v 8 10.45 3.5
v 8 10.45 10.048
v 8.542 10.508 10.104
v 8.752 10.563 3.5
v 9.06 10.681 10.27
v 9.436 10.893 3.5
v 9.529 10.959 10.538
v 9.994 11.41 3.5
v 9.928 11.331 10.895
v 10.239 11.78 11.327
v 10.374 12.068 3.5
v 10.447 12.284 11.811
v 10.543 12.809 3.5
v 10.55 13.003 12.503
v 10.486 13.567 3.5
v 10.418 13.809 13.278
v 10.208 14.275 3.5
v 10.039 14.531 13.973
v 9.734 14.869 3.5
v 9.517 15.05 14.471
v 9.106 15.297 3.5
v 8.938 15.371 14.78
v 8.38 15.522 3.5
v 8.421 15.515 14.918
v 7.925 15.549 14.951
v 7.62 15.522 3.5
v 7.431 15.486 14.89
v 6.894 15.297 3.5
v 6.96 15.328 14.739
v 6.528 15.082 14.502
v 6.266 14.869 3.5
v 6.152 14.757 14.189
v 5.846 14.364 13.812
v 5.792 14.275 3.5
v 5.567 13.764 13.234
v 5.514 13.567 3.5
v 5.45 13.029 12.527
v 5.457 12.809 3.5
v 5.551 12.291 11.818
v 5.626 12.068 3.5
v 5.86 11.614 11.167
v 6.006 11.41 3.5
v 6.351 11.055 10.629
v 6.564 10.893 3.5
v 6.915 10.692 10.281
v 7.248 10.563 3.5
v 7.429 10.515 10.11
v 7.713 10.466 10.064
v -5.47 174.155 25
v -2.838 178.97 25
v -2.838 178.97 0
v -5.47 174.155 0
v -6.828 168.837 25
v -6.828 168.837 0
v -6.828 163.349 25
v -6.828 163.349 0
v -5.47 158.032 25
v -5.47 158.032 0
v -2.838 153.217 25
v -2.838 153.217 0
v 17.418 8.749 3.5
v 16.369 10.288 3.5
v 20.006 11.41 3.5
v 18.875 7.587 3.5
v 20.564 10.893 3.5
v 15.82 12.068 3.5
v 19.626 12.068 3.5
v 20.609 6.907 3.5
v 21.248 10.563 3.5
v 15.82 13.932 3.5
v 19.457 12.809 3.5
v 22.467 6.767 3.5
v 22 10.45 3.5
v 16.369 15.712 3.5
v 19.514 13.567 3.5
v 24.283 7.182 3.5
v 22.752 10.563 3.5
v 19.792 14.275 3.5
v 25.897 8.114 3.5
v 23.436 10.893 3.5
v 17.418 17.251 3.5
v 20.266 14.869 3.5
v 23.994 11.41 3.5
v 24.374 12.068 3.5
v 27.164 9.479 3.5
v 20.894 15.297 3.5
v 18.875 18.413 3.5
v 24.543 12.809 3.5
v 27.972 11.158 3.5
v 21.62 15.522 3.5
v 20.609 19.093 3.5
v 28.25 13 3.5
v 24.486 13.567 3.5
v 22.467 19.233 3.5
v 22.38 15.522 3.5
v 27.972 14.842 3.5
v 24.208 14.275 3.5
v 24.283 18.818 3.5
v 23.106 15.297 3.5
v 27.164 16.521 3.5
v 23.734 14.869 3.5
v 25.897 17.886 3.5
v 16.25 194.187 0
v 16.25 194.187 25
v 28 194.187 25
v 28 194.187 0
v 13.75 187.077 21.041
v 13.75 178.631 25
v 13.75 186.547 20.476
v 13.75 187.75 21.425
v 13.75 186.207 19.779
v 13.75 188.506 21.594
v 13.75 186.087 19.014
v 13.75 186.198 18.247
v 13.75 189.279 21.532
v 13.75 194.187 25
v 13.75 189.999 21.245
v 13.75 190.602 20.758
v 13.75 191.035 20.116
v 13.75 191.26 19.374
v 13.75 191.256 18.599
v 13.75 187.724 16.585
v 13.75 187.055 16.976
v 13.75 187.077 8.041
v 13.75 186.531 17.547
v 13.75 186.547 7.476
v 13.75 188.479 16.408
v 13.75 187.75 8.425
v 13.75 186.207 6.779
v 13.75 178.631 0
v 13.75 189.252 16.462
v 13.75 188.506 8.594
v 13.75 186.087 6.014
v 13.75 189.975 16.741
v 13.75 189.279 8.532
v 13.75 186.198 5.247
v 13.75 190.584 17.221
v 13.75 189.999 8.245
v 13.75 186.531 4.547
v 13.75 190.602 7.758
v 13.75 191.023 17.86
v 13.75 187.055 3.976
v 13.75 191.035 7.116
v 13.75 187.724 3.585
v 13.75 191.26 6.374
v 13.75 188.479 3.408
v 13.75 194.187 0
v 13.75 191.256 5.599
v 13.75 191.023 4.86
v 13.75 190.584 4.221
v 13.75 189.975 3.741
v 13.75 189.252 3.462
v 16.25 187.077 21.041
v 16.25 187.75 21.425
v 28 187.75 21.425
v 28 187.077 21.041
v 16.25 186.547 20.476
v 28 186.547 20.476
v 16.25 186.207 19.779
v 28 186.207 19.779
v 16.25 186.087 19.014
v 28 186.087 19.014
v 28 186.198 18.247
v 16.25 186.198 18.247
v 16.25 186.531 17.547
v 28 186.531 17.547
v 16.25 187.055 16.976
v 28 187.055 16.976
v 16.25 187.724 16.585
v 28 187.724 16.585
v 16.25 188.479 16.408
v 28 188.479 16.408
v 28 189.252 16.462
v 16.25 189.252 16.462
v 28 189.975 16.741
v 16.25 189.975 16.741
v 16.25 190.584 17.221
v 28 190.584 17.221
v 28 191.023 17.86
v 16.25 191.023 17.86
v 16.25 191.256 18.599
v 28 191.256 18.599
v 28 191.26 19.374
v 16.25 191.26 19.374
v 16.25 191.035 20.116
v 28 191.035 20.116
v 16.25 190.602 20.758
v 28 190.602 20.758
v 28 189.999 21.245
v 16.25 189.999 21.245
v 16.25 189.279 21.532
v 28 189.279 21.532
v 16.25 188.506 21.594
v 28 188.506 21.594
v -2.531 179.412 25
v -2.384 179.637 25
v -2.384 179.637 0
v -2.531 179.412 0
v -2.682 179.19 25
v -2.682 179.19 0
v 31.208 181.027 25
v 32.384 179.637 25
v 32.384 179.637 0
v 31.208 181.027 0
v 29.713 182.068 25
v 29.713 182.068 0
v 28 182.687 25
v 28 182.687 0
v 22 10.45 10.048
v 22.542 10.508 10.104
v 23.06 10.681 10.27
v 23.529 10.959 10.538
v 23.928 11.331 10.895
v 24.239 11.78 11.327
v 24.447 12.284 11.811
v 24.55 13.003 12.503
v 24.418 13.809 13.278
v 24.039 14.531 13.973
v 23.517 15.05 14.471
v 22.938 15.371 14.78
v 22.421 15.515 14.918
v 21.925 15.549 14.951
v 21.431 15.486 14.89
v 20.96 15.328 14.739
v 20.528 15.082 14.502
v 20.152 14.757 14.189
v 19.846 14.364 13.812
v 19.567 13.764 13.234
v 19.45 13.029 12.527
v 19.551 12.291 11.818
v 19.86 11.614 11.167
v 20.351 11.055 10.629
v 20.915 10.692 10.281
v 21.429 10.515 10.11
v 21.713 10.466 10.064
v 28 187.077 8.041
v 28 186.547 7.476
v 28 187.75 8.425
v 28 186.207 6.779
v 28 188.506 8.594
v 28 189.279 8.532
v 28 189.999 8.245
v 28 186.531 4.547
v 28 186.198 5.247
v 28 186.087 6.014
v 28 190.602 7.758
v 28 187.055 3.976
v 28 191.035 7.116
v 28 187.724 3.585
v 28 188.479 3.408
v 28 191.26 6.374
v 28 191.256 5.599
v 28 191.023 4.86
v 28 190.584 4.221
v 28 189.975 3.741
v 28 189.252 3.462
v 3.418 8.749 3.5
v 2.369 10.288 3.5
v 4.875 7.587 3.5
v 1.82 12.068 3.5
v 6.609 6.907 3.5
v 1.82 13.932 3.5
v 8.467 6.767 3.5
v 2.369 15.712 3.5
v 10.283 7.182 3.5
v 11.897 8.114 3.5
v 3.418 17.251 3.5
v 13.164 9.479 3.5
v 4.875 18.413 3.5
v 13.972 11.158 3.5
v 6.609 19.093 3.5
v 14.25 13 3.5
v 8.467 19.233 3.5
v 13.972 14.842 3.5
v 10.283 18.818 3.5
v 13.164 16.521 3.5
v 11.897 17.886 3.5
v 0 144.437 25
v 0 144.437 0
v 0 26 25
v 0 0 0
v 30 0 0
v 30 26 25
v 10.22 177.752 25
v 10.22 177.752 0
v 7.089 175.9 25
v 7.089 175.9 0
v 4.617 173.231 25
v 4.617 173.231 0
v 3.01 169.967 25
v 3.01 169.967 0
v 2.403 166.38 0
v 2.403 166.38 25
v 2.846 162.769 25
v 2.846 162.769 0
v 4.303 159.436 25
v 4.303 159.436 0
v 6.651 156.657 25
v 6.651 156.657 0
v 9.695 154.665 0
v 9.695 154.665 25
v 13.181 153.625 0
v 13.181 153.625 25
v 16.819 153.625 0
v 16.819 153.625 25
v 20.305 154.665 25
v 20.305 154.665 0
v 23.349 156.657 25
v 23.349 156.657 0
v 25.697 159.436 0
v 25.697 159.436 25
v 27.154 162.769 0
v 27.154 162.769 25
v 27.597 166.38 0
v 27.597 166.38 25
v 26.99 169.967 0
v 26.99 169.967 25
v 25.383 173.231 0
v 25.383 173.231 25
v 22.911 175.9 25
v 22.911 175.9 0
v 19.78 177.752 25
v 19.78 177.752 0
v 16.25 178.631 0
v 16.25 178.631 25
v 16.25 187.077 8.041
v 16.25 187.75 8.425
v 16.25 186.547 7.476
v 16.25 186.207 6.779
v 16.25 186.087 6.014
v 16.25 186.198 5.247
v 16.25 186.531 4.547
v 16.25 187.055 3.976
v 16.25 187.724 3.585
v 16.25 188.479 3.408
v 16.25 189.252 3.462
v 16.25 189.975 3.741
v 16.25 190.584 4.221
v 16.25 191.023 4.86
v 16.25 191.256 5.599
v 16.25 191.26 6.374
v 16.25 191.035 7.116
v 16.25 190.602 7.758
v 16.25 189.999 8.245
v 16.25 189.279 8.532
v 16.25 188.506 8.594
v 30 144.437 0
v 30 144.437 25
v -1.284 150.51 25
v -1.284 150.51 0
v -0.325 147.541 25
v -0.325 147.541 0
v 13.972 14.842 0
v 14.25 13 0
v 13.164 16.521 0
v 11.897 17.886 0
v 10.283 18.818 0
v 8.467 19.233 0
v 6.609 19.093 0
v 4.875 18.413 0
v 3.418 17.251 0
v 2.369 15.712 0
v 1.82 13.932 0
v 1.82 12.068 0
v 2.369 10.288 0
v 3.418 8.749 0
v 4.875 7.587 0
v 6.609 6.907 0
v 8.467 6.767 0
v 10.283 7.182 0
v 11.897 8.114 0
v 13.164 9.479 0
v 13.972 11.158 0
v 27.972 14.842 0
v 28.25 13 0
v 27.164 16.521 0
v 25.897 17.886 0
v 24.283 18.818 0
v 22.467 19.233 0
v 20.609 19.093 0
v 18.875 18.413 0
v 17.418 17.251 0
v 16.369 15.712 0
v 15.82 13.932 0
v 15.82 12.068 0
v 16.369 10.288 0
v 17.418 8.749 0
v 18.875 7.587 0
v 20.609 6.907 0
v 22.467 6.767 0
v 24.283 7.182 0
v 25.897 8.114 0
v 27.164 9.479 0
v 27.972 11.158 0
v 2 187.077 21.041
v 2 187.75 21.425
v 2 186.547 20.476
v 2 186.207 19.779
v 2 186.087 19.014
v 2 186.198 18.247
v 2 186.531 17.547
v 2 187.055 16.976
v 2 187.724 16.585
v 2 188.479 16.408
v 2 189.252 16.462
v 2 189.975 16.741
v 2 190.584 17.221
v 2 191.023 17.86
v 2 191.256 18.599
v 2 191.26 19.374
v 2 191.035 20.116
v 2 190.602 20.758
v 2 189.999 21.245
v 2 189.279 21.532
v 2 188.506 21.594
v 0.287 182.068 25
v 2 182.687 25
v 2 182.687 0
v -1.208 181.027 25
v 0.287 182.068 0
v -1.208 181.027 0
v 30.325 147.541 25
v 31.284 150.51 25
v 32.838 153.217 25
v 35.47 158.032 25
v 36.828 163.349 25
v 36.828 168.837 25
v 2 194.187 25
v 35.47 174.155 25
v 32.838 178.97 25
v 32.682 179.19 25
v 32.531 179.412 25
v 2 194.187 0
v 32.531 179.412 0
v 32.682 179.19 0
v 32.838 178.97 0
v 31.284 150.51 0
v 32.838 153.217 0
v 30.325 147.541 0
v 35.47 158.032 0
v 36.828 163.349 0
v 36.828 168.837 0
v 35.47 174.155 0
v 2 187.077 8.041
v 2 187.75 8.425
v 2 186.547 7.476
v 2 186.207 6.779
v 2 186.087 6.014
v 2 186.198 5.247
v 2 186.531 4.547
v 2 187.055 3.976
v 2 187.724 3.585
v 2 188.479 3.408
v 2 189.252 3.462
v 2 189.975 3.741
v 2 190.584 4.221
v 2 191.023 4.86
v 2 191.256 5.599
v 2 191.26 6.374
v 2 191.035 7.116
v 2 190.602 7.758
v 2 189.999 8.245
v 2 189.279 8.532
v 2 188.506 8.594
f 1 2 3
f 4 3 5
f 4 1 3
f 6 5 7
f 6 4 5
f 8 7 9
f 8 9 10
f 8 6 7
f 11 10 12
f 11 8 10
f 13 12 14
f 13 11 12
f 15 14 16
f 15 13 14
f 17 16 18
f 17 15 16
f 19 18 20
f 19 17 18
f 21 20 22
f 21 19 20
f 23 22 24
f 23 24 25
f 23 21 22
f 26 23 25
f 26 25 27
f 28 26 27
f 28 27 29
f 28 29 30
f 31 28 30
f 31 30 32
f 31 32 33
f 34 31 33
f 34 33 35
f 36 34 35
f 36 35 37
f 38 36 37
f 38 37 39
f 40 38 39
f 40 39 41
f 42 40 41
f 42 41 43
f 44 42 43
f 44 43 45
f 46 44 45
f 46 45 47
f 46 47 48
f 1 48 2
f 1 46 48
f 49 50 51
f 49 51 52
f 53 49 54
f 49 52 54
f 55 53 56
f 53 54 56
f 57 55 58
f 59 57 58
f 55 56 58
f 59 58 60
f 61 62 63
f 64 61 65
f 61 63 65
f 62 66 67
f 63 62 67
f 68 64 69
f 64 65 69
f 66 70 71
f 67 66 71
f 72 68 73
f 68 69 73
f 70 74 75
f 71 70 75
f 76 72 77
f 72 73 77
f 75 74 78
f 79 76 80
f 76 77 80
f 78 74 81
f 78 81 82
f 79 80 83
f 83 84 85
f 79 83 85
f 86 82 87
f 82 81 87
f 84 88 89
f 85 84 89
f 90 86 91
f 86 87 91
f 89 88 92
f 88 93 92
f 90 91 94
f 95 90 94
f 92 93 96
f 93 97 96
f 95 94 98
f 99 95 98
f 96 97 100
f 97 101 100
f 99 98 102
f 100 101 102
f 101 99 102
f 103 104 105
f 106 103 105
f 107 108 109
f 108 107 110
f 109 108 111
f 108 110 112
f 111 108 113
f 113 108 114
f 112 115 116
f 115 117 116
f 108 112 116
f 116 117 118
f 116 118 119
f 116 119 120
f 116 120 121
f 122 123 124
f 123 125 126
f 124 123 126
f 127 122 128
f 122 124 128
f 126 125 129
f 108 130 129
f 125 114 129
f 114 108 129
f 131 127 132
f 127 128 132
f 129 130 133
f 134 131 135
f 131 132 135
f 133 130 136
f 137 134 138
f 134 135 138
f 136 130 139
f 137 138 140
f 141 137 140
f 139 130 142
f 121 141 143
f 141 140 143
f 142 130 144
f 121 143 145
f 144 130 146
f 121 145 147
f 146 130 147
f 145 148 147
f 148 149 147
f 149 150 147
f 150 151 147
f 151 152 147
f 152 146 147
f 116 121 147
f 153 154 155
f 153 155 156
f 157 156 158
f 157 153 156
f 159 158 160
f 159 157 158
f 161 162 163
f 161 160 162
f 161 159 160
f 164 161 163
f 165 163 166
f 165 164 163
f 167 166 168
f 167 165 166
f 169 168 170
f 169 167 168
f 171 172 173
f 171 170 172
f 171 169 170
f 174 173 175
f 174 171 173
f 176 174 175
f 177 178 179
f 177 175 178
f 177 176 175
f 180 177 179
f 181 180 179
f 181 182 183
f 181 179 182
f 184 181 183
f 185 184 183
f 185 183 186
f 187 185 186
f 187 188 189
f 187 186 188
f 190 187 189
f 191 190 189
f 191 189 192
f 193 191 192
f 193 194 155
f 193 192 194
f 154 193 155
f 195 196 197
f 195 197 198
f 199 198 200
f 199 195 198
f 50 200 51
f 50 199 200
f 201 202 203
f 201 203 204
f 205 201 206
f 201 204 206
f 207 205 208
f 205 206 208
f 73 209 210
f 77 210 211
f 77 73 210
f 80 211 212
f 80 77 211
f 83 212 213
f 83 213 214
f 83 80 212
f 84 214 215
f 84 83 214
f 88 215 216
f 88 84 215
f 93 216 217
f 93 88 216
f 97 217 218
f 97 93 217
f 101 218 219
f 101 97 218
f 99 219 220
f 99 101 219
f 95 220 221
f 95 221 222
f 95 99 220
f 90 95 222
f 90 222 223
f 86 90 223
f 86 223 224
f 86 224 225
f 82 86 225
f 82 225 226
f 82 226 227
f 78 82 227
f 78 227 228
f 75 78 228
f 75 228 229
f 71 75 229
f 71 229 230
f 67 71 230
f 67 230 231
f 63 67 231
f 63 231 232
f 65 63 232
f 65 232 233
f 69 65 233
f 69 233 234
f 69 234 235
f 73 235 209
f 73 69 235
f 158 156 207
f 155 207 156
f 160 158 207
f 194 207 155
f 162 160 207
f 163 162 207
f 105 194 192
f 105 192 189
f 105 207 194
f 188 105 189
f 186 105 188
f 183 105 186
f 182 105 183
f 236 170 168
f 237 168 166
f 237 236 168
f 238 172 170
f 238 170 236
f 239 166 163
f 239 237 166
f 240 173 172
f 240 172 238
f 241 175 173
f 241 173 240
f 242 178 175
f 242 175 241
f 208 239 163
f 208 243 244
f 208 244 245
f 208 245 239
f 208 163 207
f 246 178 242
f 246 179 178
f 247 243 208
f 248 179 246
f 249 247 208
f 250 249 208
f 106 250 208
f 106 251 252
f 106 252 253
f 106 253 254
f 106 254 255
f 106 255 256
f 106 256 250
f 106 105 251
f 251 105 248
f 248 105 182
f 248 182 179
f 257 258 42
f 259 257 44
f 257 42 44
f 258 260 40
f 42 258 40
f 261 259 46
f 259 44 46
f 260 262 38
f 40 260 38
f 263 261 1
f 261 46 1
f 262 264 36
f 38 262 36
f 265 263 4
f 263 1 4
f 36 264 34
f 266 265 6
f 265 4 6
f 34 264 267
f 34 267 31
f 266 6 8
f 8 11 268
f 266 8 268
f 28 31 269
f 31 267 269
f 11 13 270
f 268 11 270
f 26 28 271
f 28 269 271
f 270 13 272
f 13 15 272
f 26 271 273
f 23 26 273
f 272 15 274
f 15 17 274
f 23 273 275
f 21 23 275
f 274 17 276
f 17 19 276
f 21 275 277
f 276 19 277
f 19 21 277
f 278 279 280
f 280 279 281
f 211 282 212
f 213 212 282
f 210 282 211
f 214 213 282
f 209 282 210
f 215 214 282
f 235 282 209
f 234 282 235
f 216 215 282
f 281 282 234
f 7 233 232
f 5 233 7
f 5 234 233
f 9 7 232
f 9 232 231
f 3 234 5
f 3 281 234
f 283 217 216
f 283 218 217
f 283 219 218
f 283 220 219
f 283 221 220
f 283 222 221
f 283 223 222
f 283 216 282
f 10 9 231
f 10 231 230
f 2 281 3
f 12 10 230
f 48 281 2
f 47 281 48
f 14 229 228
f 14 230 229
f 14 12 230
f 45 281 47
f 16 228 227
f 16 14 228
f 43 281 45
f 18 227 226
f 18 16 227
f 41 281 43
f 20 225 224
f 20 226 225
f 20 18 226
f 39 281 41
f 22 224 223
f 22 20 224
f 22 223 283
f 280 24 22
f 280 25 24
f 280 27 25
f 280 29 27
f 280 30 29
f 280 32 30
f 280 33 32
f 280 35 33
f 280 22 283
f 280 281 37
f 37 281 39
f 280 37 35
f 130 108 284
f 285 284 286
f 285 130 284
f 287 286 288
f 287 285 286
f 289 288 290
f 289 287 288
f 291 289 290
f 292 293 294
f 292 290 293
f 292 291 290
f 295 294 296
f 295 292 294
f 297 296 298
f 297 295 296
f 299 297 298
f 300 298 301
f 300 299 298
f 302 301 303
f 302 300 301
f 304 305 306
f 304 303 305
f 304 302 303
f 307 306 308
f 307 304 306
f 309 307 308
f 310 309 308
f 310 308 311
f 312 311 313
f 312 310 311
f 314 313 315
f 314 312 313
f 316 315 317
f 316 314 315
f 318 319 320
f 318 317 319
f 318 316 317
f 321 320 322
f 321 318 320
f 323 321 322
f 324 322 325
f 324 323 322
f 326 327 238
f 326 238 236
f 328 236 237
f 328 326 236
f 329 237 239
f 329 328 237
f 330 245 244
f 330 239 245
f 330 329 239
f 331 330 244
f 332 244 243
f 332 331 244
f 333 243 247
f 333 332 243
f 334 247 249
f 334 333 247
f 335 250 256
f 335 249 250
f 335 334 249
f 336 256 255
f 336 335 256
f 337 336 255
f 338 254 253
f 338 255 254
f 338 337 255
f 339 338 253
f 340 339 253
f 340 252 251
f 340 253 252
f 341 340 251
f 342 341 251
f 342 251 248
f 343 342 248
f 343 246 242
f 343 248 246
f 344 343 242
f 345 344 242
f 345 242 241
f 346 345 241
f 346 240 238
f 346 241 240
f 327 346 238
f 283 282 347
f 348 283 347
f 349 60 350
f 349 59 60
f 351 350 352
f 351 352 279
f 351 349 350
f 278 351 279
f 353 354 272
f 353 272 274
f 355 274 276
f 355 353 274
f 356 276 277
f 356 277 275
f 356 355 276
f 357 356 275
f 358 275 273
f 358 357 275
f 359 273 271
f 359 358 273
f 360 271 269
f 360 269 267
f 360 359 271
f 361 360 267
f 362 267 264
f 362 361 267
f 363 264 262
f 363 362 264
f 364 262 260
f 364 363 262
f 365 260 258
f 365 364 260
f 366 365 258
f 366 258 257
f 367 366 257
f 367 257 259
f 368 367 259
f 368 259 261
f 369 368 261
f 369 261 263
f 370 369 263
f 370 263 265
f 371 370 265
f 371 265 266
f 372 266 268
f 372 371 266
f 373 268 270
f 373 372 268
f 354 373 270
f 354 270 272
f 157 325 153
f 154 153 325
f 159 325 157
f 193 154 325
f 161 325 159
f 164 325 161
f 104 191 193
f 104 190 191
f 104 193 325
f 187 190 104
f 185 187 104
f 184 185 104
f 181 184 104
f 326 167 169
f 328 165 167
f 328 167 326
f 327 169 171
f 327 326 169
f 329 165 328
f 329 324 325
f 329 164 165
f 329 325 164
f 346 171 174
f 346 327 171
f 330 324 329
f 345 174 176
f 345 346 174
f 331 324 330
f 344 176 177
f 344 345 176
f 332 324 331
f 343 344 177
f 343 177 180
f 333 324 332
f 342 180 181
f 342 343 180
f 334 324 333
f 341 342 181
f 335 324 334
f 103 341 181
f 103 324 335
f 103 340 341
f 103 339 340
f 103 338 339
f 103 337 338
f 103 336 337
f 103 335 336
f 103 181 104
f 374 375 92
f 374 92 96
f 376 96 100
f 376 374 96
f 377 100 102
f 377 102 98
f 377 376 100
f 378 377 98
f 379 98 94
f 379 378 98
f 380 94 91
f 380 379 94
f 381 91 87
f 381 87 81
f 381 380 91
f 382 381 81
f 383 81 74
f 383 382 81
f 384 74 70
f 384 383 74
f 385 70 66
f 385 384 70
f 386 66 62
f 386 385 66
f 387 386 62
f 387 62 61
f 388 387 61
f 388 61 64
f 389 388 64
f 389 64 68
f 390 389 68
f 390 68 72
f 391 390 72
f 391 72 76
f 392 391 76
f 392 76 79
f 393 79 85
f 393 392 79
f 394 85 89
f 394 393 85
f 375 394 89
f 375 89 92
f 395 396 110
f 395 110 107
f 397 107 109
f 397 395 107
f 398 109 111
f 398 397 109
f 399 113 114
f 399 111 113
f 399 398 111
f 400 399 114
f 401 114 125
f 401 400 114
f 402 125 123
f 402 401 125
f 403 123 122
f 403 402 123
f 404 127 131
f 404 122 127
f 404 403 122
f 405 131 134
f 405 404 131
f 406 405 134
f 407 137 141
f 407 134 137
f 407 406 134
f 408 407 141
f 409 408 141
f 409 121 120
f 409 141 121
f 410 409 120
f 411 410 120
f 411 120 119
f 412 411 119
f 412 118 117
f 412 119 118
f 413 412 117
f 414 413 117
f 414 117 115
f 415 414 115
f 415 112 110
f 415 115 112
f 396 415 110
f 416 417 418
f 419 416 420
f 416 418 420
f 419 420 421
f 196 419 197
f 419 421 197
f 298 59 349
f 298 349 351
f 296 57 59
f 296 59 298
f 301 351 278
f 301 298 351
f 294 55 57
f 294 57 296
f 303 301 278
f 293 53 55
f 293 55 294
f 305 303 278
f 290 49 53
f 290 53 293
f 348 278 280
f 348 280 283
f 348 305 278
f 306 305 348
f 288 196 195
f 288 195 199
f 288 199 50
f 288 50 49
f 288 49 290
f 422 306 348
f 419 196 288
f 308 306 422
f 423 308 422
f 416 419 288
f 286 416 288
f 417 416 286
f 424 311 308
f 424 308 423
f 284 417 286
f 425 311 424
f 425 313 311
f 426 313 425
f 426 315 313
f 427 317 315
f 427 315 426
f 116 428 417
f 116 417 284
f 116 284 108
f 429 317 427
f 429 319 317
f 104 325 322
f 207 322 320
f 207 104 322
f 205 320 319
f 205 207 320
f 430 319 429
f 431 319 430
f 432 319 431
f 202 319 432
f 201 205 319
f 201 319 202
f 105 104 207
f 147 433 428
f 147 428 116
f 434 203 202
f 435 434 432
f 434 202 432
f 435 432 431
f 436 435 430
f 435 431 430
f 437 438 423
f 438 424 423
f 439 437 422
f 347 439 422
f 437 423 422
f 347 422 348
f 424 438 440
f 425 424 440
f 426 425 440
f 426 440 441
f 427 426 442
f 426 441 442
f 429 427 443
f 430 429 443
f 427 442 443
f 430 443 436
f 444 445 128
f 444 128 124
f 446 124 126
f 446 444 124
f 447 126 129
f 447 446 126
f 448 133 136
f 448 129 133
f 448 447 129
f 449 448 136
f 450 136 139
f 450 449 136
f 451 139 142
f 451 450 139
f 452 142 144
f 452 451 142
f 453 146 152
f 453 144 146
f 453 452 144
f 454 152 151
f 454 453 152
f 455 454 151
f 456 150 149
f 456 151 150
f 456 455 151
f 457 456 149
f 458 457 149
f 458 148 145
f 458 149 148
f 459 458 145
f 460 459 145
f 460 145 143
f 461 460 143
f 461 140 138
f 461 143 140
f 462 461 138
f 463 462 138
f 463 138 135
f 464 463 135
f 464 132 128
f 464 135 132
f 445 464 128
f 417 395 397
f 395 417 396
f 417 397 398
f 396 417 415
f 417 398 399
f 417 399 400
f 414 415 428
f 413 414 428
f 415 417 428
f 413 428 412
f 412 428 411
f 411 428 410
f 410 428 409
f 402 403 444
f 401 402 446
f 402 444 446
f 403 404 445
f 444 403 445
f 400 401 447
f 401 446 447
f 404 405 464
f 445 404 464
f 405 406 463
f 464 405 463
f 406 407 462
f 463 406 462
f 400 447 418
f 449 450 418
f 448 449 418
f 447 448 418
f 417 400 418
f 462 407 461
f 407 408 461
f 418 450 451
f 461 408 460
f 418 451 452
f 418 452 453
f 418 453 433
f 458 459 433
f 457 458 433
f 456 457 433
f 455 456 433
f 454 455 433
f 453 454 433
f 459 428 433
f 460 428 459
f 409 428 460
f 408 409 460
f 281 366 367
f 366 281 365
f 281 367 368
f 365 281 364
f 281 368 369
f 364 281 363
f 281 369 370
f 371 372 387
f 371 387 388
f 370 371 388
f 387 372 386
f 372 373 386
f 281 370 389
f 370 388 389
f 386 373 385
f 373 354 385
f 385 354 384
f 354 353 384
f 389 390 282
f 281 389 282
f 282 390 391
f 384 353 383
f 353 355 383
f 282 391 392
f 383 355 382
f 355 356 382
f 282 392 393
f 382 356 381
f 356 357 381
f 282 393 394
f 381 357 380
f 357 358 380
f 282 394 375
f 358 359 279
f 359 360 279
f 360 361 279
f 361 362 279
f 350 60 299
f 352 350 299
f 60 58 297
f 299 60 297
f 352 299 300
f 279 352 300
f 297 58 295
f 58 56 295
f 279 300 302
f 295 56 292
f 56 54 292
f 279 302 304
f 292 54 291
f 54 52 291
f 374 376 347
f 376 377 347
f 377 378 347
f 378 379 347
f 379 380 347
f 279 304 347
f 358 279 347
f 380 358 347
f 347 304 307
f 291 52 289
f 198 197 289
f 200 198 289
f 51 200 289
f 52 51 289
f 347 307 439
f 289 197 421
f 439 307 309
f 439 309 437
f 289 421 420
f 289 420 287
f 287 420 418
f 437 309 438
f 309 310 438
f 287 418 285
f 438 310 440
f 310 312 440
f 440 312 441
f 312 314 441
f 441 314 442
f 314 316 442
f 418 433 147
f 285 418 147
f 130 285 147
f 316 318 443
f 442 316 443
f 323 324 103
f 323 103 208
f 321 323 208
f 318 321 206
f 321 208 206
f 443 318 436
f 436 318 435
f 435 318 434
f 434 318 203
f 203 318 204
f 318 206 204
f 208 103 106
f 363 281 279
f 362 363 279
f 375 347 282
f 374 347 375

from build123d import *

# Parameters (mm, degrees)
BOSS_EXTRUDE1_DEPTH      = 25
CUT_EXTRUDE2_DEPTH       = 194.321380264
SKETCH4_R                = 6.25
CUT_EXTRUDE5_DEPTH       = 3.5
SKETCH5_R                = 2.55
CUT_EXTRUDE6_DEPTH       = 194.321380264
SKETCH6_R                = 12.6
CUT_EXTRUDE7_DEPTH       = 194.321380264
SKETCH8_W                = 30
SKETCH8_H                = 12
BOSS_EXTRUDE2_DEPTH      = 25
FILLET1_R                = 15
FILLET2_R                = 2
CUT_EXTRUDE8_DEPTH       = 200.255045248
CUT_EXTRUDE8_DEPTH_BACK  = 200.255045248
SKETCH9_R                = 2.6
CUT_EXTRUDE9_START       = 2
SKETCH10_W               = 25
SKETCH10_H               = 16.5
CUT_EXTRUDE9_DEPTH       = 25
CUT_EXTRUDE10_START      = 28
SKETCH11_W               = 25
SKETCH11_H               = 16.5
CUT_EXTRUDE10_DEPTH      = 25
CUT_EXTRUDE11_DEPTH      = 200.255045248
CUT_EXTRUDE11_DEPTH_BACK = 200.255045248
SKETCH13_W               = 2.5
SKETCH13_H               = 16
FILLET6_R                = 7


with BuildPart() as part:
    # Sketch1 → Boss-Extrude1 (new body)
    with BuildSketch(Plane.XY):
        with BuildLine():
            Line((0, 0), (30, 0))
            Line((30, 0), (30, 150))
            ThreePointArc((30, 150), (15, 188.093476939), (0, 150))
            Line((0, 150), (0, 0))
        make_face()
    extrude(amount=BOSS_EXTRUDE1_DEPTH)

    # Sketch2 → Cut-Extrude2 (cut, through all)
    with BuildSketch(Plane(origin=(0, 0, 0), x_dir=(0, 0, -1), z_dir=(1, 0, 0))):
        Polygon((0, 0), (-25, 26), (-25, 0), align=None)
    extrude(amount=CUT_EXTRUDE2_DEPTH, mode=Mode.SUBTRACT)

    # Sketch4 → Cut-Extrude5 (cut)
    with BuildSketch(Plane.XY):
        with Locations((8, 13)):
            Circle(SKETCH4_R)
        with Locations((22, 13)):
            Circle(SKETCH4_R)
    extrude(amount=CUT_EXTRUDE5_DEPTH, mode=Mode.SUBTRACT)

    # Sketch5 → Cut-Extrude6 (cut, through all)
    with BuildSketch(Plane.XY):
        with Locations(Location((8, 13, 0), (0, 0, 270))):
            Circle(SKETCH5_R)
        with Locations(Location((22, 13, 0), (0, 0, 270))):
            Circle(SKETCH5_R)
    extrude(amount=CUT_EXTRUDE6_DEPTH, mode=Mode.SUBTRACT)

    # Sketch6 → Cut-Extrude7 (cut, through all)
    with BuildSketch(Plane.XY):
        with Locations((15, 166.093476939)):
            Circle(SKETCH6_R)
    extrude(amount=CUT_EXTRUDE7_DEPTH, mode=Mode.SUBTRACT)

    # Sketch8 → Boss-Extrude2 (add)
    with BuildSketch(Plane.XY):
        with Locations((15, 188.186953879)):
            Rectangle(SKETCH8_W, SKETCH8_H)
    extrude(amount=BOSS_EXTRUDE2_DEPTH)

    # Fillet1
    fillet1_edges = [part.edges().sort_by_distance(p)[0] for p in [
        (0, 182.186953879, 12.5),
        (30, 182.186953879, 12.5),
        (0, 150, 12.5),
        (30, 150, 12.5),
    ]]
    fillet(fillet1_edges, radius=FILLET1_R)

    # Fillet2
    fillet2_edges = [part.edges().sort_by_distance(p)[0] for p in [
        (0, 194.186953879, 12.5),
        (30, 194.186953879, 12.5),
    ]]
    fillet(fillet2_edges, radius=FILLET2_R)

    # Sketch9 → Cut-Extrude8 (cut, two sides: drawn at the far end of the back side and taken through both)
    with BuildSketch(Plane(origin=(0, 0, 0), x_dir=(0, 0, -1), z_dir=(1, 0, 0)).offset(-CUT_EXTRUDE8_DEPTH_BACK)):
        with Locations(Location((-6, 188.686953879, 0), (0, 0, 201.12545117))):
            Circle(SKETCH9_R)
        with Locations(Location((-19, 188.686953879, 0), (0, 0, 201.12545117))):
            Circle(SKETCH9_R)
    extrude(amount=CUT_EXTRUDE8_DEPTH + CUT_EXTRUDE8_DEPTH_BACK, mode=Mode.SUBTRACT)

    # Sketch10 → Cut-Extrude9 (cut)
    with BuildSketch(Plane(origin=(0, 0, 0), x_dir=(0, 0, -1), z_dir=(1, 0, 0)).offset(CUT_EXTRUDE9_START)):
        with Locations((-12.5, 190.936953879)):
            Rectangle(SKETCH10_W, SKETCH10_H)
    extrude(amount=-CUT_EXTRUDE9_DEPTH, mode=Mode.SUBTRACT)

    # Sketch11 → Cut-Extrude10 (cut)
    with BuildSketch(Plane(origin=(0, 0, 0), x_dir=(0, 0, -1), z_dir=(1, 0, 0)).offset(CUT_EXTRUDE10_START)):
        with Locations((-12.5, 190.936953879)):
            Rectangle(SKETCH11_W, SKETCH11_H)
    extrude(amount=CUT_EXTRUDE10_DEPTH, mode=Mode.SUBTRACT)

    # Sketch13 → Cut-Extrude11 (cut, two sides: drawn at the far end of the back side and taken through both)
    with BuildSketch(Plane.XY.offset(-CUT_EXTRUDE11_DEPTH_BACK)):
        with Locations((15, 186.186953879)):
            Rectangle(SKETCH13_W, SKETCH13_H)
    extrude(amount=CUT_EXTRUDE11_DEPTH + CUT_EXTRUDE11_DEPTH_BACK, mode=Mode.SUBTRACT)

    # Fillet6
    # the kernel refuses this fillet: 7 mm, written as the material it takes off along each edge
    with BuildSketch(Plane(origin=(30.880271574, 182.686953879, -8.501523298), x_dir=(-1, 0, 0), z_dir=(0, 0, 1))) as fillet6_piece_1:
        with BuildLine():
            CenterArc((4.384431788, 6.836483164), FILLET6_R, 212.743731737, 44.847779206)
            Line((-1.503255553, 3.050305966), (-1.6210093, 2.974582422))
            ThreePointArc((-1.6210093, 2.974582422), (-0.790485812, 1.506002918), (-0.131784132, -0.047254022))
            Line((-0.131784132, -0.047254022), (0, -0.14))
            ThreePointArc((0, -0.14), (1.440135787, -0.14), (2.85018837, -0.136729663))
            Line((2.85018837, -0.136729663), (2.880271574, 0))
        make_face()
    extrude(amount=42.003046595, mode=Mode.SUBTRACT)
    with BuildSketch(Plane(origin=(-0.880271574, 182.686953879, -8.501523298), x_dir=(-0.44205476486446993, -0.8969880628306143, 0), z_dir=(0, 0, 1))) as fillet6_piece_2:
        with BuildLine():
            CenterArc((4.194084827, 6.954882933), FILLET6_R, 218.64354594, 44.847779206)
            Line((-1.273237773, 2.58356922), (-1.382584225, 2.496142945))
            ThreePointArc((-1.382584225, 2.496142945), (-0.762197216, 1.229896943), (-0.125578329, -0.061887667))
            Line((-0.125578329, -0.061887667), (0.01586951, -0.139097659))
            ThreePointArc((0.01586951, -0.139097659), (1.70030466, -0.043320572), (3.384739809, -0.139097659))
            Line((3.384739809, -0.139097659), (3.400609319, 0))
        make_face()
    extrude(amount=42.003046595, mode=Mode.SUBTRACT)


solid = part.part
